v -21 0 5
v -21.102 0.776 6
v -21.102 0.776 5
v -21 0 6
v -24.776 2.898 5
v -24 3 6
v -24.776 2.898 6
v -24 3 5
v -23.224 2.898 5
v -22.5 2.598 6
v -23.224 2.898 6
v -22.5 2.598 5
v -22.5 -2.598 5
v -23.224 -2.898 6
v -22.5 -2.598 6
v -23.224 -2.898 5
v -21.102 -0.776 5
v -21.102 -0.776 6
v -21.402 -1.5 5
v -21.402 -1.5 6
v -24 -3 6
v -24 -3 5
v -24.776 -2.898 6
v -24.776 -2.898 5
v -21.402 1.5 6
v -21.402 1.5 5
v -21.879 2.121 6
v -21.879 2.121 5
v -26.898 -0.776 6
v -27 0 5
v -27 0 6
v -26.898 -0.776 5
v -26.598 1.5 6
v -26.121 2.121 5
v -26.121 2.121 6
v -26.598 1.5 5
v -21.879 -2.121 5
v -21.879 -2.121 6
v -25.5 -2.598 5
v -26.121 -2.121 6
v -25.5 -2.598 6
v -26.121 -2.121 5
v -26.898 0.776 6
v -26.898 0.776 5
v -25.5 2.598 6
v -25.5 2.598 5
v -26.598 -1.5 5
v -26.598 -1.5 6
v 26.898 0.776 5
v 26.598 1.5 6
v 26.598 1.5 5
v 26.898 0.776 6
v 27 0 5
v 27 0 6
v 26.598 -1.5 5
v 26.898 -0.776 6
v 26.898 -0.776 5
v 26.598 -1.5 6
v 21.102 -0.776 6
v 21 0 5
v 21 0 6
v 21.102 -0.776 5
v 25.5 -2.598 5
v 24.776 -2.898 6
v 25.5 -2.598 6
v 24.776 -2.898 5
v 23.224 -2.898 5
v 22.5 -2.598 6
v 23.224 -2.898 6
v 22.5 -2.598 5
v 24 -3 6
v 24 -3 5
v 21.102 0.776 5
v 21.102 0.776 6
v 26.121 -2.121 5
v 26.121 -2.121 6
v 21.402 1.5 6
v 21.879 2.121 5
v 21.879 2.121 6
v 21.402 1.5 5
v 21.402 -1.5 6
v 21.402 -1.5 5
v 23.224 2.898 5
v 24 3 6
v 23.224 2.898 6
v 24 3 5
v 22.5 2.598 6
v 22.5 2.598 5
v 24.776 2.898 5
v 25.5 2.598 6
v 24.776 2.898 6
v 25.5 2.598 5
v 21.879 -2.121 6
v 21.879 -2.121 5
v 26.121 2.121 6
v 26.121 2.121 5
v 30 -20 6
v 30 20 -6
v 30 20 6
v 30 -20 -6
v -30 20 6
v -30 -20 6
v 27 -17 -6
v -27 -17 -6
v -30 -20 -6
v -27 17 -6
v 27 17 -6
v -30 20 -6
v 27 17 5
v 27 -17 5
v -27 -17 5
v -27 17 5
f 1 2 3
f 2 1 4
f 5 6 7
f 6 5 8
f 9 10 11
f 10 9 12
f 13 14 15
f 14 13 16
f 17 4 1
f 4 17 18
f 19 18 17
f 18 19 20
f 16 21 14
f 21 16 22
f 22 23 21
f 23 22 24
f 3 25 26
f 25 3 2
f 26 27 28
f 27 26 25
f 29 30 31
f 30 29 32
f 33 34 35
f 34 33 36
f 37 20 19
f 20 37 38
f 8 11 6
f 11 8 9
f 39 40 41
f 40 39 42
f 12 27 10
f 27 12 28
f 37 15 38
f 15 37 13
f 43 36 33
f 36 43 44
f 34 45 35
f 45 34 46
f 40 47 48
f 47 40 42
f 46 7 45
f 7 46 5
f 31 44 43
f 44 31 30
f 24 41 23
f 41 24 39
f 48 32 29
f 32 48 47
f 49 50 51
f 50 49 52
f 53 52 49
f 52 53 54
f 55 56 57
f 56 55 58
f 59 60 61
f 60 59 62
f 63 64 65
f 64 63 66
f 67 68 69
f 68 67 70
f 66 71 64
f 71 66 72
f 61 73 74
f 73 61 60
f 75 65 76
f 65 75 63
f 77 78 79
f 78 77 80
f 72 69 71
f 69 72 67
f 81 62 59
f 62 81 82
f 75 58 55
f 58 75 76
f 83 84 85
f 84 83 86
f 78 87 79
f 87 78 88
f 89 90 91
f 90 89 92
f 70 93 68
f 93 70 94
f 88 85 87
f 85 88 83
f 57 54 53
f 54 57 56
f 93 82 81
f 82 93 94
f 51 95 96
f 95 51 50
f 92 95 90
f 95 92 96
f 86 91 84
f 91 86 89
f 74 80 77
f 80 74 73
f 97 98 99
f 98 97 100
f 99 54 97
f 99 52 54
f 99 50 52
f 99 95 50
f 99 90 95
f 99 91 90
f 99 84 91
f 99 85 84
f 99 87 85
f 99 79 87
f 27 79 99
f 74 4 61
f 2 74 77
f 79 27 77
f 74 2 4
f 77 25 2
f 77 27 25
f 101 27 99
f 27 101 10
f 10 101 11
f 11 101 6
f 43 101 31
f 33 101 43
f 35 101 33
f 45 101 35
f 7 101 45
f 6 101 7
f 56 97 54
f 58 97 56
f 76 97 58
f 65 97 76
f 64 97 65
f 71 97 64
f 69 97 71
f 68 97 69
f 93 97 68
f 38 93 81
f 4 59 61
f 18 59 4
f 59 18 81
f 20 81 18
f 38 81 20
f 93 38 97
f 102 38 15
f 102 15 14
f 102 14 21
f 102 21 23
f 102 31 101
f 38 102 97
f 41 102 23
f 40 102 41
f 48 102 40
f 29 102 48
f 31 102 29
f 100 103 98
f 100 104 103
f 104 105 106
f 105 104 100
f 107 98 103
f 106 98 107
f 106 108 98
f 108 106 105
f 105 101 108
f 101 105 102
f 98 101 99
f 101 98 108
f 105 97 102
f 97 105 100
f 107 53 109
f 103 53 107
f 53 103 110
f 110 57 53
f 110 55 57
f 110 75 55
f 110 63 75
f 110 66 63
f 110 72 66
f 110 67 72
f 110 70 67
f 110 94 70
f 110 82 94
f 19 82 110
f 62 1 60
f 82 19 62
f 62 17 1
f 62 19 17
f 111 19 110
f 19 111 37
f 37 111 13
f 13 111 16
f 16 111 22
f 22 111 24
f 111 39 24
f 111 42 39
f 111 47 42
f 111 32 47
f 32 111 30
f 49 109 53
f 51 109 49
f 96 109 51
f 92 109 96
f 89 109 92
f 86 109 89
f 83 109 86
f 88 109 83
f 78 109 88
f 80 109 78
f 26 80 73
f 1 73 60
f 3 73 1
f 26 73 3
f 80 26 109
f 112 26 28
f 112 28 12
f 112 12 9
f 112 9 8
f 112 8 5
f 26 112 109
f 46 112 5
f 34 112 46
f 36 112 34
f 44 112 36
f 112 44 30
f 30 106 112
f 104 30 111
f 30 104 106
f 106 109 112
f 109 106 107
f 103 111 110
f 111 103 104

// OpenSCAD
// A bracket whose dimensions are meant to be overridden with -D.
// [Size]
width = 60;   // [20:1:120]
depth = 40;   // [10:1:80]
height = 12;  // [4:1:40]
wall = 3;     // [1:0.5:8]
label = "OPENSCAD-CLI";

module bracket() {
    difference() {
        cube([width, depth, height], center = true);
        // Hollow it out, leaving walls on all sides.
        translate([0, 0, -1])
            cube([width - 2 * wall, depth - 2 * wall, height], center = true);
        // Two mounting holes through the base.
        for (x = [-1, 1])
            translate([x * (width / 2 - wall * 2), 0, 0])
                cylinder(h = height * 2, r = wall, center = true, $fn = 24);
    }
}

bracket();
echo(str("label=", label, " w=", width, " d=", depth, " h=", height));
